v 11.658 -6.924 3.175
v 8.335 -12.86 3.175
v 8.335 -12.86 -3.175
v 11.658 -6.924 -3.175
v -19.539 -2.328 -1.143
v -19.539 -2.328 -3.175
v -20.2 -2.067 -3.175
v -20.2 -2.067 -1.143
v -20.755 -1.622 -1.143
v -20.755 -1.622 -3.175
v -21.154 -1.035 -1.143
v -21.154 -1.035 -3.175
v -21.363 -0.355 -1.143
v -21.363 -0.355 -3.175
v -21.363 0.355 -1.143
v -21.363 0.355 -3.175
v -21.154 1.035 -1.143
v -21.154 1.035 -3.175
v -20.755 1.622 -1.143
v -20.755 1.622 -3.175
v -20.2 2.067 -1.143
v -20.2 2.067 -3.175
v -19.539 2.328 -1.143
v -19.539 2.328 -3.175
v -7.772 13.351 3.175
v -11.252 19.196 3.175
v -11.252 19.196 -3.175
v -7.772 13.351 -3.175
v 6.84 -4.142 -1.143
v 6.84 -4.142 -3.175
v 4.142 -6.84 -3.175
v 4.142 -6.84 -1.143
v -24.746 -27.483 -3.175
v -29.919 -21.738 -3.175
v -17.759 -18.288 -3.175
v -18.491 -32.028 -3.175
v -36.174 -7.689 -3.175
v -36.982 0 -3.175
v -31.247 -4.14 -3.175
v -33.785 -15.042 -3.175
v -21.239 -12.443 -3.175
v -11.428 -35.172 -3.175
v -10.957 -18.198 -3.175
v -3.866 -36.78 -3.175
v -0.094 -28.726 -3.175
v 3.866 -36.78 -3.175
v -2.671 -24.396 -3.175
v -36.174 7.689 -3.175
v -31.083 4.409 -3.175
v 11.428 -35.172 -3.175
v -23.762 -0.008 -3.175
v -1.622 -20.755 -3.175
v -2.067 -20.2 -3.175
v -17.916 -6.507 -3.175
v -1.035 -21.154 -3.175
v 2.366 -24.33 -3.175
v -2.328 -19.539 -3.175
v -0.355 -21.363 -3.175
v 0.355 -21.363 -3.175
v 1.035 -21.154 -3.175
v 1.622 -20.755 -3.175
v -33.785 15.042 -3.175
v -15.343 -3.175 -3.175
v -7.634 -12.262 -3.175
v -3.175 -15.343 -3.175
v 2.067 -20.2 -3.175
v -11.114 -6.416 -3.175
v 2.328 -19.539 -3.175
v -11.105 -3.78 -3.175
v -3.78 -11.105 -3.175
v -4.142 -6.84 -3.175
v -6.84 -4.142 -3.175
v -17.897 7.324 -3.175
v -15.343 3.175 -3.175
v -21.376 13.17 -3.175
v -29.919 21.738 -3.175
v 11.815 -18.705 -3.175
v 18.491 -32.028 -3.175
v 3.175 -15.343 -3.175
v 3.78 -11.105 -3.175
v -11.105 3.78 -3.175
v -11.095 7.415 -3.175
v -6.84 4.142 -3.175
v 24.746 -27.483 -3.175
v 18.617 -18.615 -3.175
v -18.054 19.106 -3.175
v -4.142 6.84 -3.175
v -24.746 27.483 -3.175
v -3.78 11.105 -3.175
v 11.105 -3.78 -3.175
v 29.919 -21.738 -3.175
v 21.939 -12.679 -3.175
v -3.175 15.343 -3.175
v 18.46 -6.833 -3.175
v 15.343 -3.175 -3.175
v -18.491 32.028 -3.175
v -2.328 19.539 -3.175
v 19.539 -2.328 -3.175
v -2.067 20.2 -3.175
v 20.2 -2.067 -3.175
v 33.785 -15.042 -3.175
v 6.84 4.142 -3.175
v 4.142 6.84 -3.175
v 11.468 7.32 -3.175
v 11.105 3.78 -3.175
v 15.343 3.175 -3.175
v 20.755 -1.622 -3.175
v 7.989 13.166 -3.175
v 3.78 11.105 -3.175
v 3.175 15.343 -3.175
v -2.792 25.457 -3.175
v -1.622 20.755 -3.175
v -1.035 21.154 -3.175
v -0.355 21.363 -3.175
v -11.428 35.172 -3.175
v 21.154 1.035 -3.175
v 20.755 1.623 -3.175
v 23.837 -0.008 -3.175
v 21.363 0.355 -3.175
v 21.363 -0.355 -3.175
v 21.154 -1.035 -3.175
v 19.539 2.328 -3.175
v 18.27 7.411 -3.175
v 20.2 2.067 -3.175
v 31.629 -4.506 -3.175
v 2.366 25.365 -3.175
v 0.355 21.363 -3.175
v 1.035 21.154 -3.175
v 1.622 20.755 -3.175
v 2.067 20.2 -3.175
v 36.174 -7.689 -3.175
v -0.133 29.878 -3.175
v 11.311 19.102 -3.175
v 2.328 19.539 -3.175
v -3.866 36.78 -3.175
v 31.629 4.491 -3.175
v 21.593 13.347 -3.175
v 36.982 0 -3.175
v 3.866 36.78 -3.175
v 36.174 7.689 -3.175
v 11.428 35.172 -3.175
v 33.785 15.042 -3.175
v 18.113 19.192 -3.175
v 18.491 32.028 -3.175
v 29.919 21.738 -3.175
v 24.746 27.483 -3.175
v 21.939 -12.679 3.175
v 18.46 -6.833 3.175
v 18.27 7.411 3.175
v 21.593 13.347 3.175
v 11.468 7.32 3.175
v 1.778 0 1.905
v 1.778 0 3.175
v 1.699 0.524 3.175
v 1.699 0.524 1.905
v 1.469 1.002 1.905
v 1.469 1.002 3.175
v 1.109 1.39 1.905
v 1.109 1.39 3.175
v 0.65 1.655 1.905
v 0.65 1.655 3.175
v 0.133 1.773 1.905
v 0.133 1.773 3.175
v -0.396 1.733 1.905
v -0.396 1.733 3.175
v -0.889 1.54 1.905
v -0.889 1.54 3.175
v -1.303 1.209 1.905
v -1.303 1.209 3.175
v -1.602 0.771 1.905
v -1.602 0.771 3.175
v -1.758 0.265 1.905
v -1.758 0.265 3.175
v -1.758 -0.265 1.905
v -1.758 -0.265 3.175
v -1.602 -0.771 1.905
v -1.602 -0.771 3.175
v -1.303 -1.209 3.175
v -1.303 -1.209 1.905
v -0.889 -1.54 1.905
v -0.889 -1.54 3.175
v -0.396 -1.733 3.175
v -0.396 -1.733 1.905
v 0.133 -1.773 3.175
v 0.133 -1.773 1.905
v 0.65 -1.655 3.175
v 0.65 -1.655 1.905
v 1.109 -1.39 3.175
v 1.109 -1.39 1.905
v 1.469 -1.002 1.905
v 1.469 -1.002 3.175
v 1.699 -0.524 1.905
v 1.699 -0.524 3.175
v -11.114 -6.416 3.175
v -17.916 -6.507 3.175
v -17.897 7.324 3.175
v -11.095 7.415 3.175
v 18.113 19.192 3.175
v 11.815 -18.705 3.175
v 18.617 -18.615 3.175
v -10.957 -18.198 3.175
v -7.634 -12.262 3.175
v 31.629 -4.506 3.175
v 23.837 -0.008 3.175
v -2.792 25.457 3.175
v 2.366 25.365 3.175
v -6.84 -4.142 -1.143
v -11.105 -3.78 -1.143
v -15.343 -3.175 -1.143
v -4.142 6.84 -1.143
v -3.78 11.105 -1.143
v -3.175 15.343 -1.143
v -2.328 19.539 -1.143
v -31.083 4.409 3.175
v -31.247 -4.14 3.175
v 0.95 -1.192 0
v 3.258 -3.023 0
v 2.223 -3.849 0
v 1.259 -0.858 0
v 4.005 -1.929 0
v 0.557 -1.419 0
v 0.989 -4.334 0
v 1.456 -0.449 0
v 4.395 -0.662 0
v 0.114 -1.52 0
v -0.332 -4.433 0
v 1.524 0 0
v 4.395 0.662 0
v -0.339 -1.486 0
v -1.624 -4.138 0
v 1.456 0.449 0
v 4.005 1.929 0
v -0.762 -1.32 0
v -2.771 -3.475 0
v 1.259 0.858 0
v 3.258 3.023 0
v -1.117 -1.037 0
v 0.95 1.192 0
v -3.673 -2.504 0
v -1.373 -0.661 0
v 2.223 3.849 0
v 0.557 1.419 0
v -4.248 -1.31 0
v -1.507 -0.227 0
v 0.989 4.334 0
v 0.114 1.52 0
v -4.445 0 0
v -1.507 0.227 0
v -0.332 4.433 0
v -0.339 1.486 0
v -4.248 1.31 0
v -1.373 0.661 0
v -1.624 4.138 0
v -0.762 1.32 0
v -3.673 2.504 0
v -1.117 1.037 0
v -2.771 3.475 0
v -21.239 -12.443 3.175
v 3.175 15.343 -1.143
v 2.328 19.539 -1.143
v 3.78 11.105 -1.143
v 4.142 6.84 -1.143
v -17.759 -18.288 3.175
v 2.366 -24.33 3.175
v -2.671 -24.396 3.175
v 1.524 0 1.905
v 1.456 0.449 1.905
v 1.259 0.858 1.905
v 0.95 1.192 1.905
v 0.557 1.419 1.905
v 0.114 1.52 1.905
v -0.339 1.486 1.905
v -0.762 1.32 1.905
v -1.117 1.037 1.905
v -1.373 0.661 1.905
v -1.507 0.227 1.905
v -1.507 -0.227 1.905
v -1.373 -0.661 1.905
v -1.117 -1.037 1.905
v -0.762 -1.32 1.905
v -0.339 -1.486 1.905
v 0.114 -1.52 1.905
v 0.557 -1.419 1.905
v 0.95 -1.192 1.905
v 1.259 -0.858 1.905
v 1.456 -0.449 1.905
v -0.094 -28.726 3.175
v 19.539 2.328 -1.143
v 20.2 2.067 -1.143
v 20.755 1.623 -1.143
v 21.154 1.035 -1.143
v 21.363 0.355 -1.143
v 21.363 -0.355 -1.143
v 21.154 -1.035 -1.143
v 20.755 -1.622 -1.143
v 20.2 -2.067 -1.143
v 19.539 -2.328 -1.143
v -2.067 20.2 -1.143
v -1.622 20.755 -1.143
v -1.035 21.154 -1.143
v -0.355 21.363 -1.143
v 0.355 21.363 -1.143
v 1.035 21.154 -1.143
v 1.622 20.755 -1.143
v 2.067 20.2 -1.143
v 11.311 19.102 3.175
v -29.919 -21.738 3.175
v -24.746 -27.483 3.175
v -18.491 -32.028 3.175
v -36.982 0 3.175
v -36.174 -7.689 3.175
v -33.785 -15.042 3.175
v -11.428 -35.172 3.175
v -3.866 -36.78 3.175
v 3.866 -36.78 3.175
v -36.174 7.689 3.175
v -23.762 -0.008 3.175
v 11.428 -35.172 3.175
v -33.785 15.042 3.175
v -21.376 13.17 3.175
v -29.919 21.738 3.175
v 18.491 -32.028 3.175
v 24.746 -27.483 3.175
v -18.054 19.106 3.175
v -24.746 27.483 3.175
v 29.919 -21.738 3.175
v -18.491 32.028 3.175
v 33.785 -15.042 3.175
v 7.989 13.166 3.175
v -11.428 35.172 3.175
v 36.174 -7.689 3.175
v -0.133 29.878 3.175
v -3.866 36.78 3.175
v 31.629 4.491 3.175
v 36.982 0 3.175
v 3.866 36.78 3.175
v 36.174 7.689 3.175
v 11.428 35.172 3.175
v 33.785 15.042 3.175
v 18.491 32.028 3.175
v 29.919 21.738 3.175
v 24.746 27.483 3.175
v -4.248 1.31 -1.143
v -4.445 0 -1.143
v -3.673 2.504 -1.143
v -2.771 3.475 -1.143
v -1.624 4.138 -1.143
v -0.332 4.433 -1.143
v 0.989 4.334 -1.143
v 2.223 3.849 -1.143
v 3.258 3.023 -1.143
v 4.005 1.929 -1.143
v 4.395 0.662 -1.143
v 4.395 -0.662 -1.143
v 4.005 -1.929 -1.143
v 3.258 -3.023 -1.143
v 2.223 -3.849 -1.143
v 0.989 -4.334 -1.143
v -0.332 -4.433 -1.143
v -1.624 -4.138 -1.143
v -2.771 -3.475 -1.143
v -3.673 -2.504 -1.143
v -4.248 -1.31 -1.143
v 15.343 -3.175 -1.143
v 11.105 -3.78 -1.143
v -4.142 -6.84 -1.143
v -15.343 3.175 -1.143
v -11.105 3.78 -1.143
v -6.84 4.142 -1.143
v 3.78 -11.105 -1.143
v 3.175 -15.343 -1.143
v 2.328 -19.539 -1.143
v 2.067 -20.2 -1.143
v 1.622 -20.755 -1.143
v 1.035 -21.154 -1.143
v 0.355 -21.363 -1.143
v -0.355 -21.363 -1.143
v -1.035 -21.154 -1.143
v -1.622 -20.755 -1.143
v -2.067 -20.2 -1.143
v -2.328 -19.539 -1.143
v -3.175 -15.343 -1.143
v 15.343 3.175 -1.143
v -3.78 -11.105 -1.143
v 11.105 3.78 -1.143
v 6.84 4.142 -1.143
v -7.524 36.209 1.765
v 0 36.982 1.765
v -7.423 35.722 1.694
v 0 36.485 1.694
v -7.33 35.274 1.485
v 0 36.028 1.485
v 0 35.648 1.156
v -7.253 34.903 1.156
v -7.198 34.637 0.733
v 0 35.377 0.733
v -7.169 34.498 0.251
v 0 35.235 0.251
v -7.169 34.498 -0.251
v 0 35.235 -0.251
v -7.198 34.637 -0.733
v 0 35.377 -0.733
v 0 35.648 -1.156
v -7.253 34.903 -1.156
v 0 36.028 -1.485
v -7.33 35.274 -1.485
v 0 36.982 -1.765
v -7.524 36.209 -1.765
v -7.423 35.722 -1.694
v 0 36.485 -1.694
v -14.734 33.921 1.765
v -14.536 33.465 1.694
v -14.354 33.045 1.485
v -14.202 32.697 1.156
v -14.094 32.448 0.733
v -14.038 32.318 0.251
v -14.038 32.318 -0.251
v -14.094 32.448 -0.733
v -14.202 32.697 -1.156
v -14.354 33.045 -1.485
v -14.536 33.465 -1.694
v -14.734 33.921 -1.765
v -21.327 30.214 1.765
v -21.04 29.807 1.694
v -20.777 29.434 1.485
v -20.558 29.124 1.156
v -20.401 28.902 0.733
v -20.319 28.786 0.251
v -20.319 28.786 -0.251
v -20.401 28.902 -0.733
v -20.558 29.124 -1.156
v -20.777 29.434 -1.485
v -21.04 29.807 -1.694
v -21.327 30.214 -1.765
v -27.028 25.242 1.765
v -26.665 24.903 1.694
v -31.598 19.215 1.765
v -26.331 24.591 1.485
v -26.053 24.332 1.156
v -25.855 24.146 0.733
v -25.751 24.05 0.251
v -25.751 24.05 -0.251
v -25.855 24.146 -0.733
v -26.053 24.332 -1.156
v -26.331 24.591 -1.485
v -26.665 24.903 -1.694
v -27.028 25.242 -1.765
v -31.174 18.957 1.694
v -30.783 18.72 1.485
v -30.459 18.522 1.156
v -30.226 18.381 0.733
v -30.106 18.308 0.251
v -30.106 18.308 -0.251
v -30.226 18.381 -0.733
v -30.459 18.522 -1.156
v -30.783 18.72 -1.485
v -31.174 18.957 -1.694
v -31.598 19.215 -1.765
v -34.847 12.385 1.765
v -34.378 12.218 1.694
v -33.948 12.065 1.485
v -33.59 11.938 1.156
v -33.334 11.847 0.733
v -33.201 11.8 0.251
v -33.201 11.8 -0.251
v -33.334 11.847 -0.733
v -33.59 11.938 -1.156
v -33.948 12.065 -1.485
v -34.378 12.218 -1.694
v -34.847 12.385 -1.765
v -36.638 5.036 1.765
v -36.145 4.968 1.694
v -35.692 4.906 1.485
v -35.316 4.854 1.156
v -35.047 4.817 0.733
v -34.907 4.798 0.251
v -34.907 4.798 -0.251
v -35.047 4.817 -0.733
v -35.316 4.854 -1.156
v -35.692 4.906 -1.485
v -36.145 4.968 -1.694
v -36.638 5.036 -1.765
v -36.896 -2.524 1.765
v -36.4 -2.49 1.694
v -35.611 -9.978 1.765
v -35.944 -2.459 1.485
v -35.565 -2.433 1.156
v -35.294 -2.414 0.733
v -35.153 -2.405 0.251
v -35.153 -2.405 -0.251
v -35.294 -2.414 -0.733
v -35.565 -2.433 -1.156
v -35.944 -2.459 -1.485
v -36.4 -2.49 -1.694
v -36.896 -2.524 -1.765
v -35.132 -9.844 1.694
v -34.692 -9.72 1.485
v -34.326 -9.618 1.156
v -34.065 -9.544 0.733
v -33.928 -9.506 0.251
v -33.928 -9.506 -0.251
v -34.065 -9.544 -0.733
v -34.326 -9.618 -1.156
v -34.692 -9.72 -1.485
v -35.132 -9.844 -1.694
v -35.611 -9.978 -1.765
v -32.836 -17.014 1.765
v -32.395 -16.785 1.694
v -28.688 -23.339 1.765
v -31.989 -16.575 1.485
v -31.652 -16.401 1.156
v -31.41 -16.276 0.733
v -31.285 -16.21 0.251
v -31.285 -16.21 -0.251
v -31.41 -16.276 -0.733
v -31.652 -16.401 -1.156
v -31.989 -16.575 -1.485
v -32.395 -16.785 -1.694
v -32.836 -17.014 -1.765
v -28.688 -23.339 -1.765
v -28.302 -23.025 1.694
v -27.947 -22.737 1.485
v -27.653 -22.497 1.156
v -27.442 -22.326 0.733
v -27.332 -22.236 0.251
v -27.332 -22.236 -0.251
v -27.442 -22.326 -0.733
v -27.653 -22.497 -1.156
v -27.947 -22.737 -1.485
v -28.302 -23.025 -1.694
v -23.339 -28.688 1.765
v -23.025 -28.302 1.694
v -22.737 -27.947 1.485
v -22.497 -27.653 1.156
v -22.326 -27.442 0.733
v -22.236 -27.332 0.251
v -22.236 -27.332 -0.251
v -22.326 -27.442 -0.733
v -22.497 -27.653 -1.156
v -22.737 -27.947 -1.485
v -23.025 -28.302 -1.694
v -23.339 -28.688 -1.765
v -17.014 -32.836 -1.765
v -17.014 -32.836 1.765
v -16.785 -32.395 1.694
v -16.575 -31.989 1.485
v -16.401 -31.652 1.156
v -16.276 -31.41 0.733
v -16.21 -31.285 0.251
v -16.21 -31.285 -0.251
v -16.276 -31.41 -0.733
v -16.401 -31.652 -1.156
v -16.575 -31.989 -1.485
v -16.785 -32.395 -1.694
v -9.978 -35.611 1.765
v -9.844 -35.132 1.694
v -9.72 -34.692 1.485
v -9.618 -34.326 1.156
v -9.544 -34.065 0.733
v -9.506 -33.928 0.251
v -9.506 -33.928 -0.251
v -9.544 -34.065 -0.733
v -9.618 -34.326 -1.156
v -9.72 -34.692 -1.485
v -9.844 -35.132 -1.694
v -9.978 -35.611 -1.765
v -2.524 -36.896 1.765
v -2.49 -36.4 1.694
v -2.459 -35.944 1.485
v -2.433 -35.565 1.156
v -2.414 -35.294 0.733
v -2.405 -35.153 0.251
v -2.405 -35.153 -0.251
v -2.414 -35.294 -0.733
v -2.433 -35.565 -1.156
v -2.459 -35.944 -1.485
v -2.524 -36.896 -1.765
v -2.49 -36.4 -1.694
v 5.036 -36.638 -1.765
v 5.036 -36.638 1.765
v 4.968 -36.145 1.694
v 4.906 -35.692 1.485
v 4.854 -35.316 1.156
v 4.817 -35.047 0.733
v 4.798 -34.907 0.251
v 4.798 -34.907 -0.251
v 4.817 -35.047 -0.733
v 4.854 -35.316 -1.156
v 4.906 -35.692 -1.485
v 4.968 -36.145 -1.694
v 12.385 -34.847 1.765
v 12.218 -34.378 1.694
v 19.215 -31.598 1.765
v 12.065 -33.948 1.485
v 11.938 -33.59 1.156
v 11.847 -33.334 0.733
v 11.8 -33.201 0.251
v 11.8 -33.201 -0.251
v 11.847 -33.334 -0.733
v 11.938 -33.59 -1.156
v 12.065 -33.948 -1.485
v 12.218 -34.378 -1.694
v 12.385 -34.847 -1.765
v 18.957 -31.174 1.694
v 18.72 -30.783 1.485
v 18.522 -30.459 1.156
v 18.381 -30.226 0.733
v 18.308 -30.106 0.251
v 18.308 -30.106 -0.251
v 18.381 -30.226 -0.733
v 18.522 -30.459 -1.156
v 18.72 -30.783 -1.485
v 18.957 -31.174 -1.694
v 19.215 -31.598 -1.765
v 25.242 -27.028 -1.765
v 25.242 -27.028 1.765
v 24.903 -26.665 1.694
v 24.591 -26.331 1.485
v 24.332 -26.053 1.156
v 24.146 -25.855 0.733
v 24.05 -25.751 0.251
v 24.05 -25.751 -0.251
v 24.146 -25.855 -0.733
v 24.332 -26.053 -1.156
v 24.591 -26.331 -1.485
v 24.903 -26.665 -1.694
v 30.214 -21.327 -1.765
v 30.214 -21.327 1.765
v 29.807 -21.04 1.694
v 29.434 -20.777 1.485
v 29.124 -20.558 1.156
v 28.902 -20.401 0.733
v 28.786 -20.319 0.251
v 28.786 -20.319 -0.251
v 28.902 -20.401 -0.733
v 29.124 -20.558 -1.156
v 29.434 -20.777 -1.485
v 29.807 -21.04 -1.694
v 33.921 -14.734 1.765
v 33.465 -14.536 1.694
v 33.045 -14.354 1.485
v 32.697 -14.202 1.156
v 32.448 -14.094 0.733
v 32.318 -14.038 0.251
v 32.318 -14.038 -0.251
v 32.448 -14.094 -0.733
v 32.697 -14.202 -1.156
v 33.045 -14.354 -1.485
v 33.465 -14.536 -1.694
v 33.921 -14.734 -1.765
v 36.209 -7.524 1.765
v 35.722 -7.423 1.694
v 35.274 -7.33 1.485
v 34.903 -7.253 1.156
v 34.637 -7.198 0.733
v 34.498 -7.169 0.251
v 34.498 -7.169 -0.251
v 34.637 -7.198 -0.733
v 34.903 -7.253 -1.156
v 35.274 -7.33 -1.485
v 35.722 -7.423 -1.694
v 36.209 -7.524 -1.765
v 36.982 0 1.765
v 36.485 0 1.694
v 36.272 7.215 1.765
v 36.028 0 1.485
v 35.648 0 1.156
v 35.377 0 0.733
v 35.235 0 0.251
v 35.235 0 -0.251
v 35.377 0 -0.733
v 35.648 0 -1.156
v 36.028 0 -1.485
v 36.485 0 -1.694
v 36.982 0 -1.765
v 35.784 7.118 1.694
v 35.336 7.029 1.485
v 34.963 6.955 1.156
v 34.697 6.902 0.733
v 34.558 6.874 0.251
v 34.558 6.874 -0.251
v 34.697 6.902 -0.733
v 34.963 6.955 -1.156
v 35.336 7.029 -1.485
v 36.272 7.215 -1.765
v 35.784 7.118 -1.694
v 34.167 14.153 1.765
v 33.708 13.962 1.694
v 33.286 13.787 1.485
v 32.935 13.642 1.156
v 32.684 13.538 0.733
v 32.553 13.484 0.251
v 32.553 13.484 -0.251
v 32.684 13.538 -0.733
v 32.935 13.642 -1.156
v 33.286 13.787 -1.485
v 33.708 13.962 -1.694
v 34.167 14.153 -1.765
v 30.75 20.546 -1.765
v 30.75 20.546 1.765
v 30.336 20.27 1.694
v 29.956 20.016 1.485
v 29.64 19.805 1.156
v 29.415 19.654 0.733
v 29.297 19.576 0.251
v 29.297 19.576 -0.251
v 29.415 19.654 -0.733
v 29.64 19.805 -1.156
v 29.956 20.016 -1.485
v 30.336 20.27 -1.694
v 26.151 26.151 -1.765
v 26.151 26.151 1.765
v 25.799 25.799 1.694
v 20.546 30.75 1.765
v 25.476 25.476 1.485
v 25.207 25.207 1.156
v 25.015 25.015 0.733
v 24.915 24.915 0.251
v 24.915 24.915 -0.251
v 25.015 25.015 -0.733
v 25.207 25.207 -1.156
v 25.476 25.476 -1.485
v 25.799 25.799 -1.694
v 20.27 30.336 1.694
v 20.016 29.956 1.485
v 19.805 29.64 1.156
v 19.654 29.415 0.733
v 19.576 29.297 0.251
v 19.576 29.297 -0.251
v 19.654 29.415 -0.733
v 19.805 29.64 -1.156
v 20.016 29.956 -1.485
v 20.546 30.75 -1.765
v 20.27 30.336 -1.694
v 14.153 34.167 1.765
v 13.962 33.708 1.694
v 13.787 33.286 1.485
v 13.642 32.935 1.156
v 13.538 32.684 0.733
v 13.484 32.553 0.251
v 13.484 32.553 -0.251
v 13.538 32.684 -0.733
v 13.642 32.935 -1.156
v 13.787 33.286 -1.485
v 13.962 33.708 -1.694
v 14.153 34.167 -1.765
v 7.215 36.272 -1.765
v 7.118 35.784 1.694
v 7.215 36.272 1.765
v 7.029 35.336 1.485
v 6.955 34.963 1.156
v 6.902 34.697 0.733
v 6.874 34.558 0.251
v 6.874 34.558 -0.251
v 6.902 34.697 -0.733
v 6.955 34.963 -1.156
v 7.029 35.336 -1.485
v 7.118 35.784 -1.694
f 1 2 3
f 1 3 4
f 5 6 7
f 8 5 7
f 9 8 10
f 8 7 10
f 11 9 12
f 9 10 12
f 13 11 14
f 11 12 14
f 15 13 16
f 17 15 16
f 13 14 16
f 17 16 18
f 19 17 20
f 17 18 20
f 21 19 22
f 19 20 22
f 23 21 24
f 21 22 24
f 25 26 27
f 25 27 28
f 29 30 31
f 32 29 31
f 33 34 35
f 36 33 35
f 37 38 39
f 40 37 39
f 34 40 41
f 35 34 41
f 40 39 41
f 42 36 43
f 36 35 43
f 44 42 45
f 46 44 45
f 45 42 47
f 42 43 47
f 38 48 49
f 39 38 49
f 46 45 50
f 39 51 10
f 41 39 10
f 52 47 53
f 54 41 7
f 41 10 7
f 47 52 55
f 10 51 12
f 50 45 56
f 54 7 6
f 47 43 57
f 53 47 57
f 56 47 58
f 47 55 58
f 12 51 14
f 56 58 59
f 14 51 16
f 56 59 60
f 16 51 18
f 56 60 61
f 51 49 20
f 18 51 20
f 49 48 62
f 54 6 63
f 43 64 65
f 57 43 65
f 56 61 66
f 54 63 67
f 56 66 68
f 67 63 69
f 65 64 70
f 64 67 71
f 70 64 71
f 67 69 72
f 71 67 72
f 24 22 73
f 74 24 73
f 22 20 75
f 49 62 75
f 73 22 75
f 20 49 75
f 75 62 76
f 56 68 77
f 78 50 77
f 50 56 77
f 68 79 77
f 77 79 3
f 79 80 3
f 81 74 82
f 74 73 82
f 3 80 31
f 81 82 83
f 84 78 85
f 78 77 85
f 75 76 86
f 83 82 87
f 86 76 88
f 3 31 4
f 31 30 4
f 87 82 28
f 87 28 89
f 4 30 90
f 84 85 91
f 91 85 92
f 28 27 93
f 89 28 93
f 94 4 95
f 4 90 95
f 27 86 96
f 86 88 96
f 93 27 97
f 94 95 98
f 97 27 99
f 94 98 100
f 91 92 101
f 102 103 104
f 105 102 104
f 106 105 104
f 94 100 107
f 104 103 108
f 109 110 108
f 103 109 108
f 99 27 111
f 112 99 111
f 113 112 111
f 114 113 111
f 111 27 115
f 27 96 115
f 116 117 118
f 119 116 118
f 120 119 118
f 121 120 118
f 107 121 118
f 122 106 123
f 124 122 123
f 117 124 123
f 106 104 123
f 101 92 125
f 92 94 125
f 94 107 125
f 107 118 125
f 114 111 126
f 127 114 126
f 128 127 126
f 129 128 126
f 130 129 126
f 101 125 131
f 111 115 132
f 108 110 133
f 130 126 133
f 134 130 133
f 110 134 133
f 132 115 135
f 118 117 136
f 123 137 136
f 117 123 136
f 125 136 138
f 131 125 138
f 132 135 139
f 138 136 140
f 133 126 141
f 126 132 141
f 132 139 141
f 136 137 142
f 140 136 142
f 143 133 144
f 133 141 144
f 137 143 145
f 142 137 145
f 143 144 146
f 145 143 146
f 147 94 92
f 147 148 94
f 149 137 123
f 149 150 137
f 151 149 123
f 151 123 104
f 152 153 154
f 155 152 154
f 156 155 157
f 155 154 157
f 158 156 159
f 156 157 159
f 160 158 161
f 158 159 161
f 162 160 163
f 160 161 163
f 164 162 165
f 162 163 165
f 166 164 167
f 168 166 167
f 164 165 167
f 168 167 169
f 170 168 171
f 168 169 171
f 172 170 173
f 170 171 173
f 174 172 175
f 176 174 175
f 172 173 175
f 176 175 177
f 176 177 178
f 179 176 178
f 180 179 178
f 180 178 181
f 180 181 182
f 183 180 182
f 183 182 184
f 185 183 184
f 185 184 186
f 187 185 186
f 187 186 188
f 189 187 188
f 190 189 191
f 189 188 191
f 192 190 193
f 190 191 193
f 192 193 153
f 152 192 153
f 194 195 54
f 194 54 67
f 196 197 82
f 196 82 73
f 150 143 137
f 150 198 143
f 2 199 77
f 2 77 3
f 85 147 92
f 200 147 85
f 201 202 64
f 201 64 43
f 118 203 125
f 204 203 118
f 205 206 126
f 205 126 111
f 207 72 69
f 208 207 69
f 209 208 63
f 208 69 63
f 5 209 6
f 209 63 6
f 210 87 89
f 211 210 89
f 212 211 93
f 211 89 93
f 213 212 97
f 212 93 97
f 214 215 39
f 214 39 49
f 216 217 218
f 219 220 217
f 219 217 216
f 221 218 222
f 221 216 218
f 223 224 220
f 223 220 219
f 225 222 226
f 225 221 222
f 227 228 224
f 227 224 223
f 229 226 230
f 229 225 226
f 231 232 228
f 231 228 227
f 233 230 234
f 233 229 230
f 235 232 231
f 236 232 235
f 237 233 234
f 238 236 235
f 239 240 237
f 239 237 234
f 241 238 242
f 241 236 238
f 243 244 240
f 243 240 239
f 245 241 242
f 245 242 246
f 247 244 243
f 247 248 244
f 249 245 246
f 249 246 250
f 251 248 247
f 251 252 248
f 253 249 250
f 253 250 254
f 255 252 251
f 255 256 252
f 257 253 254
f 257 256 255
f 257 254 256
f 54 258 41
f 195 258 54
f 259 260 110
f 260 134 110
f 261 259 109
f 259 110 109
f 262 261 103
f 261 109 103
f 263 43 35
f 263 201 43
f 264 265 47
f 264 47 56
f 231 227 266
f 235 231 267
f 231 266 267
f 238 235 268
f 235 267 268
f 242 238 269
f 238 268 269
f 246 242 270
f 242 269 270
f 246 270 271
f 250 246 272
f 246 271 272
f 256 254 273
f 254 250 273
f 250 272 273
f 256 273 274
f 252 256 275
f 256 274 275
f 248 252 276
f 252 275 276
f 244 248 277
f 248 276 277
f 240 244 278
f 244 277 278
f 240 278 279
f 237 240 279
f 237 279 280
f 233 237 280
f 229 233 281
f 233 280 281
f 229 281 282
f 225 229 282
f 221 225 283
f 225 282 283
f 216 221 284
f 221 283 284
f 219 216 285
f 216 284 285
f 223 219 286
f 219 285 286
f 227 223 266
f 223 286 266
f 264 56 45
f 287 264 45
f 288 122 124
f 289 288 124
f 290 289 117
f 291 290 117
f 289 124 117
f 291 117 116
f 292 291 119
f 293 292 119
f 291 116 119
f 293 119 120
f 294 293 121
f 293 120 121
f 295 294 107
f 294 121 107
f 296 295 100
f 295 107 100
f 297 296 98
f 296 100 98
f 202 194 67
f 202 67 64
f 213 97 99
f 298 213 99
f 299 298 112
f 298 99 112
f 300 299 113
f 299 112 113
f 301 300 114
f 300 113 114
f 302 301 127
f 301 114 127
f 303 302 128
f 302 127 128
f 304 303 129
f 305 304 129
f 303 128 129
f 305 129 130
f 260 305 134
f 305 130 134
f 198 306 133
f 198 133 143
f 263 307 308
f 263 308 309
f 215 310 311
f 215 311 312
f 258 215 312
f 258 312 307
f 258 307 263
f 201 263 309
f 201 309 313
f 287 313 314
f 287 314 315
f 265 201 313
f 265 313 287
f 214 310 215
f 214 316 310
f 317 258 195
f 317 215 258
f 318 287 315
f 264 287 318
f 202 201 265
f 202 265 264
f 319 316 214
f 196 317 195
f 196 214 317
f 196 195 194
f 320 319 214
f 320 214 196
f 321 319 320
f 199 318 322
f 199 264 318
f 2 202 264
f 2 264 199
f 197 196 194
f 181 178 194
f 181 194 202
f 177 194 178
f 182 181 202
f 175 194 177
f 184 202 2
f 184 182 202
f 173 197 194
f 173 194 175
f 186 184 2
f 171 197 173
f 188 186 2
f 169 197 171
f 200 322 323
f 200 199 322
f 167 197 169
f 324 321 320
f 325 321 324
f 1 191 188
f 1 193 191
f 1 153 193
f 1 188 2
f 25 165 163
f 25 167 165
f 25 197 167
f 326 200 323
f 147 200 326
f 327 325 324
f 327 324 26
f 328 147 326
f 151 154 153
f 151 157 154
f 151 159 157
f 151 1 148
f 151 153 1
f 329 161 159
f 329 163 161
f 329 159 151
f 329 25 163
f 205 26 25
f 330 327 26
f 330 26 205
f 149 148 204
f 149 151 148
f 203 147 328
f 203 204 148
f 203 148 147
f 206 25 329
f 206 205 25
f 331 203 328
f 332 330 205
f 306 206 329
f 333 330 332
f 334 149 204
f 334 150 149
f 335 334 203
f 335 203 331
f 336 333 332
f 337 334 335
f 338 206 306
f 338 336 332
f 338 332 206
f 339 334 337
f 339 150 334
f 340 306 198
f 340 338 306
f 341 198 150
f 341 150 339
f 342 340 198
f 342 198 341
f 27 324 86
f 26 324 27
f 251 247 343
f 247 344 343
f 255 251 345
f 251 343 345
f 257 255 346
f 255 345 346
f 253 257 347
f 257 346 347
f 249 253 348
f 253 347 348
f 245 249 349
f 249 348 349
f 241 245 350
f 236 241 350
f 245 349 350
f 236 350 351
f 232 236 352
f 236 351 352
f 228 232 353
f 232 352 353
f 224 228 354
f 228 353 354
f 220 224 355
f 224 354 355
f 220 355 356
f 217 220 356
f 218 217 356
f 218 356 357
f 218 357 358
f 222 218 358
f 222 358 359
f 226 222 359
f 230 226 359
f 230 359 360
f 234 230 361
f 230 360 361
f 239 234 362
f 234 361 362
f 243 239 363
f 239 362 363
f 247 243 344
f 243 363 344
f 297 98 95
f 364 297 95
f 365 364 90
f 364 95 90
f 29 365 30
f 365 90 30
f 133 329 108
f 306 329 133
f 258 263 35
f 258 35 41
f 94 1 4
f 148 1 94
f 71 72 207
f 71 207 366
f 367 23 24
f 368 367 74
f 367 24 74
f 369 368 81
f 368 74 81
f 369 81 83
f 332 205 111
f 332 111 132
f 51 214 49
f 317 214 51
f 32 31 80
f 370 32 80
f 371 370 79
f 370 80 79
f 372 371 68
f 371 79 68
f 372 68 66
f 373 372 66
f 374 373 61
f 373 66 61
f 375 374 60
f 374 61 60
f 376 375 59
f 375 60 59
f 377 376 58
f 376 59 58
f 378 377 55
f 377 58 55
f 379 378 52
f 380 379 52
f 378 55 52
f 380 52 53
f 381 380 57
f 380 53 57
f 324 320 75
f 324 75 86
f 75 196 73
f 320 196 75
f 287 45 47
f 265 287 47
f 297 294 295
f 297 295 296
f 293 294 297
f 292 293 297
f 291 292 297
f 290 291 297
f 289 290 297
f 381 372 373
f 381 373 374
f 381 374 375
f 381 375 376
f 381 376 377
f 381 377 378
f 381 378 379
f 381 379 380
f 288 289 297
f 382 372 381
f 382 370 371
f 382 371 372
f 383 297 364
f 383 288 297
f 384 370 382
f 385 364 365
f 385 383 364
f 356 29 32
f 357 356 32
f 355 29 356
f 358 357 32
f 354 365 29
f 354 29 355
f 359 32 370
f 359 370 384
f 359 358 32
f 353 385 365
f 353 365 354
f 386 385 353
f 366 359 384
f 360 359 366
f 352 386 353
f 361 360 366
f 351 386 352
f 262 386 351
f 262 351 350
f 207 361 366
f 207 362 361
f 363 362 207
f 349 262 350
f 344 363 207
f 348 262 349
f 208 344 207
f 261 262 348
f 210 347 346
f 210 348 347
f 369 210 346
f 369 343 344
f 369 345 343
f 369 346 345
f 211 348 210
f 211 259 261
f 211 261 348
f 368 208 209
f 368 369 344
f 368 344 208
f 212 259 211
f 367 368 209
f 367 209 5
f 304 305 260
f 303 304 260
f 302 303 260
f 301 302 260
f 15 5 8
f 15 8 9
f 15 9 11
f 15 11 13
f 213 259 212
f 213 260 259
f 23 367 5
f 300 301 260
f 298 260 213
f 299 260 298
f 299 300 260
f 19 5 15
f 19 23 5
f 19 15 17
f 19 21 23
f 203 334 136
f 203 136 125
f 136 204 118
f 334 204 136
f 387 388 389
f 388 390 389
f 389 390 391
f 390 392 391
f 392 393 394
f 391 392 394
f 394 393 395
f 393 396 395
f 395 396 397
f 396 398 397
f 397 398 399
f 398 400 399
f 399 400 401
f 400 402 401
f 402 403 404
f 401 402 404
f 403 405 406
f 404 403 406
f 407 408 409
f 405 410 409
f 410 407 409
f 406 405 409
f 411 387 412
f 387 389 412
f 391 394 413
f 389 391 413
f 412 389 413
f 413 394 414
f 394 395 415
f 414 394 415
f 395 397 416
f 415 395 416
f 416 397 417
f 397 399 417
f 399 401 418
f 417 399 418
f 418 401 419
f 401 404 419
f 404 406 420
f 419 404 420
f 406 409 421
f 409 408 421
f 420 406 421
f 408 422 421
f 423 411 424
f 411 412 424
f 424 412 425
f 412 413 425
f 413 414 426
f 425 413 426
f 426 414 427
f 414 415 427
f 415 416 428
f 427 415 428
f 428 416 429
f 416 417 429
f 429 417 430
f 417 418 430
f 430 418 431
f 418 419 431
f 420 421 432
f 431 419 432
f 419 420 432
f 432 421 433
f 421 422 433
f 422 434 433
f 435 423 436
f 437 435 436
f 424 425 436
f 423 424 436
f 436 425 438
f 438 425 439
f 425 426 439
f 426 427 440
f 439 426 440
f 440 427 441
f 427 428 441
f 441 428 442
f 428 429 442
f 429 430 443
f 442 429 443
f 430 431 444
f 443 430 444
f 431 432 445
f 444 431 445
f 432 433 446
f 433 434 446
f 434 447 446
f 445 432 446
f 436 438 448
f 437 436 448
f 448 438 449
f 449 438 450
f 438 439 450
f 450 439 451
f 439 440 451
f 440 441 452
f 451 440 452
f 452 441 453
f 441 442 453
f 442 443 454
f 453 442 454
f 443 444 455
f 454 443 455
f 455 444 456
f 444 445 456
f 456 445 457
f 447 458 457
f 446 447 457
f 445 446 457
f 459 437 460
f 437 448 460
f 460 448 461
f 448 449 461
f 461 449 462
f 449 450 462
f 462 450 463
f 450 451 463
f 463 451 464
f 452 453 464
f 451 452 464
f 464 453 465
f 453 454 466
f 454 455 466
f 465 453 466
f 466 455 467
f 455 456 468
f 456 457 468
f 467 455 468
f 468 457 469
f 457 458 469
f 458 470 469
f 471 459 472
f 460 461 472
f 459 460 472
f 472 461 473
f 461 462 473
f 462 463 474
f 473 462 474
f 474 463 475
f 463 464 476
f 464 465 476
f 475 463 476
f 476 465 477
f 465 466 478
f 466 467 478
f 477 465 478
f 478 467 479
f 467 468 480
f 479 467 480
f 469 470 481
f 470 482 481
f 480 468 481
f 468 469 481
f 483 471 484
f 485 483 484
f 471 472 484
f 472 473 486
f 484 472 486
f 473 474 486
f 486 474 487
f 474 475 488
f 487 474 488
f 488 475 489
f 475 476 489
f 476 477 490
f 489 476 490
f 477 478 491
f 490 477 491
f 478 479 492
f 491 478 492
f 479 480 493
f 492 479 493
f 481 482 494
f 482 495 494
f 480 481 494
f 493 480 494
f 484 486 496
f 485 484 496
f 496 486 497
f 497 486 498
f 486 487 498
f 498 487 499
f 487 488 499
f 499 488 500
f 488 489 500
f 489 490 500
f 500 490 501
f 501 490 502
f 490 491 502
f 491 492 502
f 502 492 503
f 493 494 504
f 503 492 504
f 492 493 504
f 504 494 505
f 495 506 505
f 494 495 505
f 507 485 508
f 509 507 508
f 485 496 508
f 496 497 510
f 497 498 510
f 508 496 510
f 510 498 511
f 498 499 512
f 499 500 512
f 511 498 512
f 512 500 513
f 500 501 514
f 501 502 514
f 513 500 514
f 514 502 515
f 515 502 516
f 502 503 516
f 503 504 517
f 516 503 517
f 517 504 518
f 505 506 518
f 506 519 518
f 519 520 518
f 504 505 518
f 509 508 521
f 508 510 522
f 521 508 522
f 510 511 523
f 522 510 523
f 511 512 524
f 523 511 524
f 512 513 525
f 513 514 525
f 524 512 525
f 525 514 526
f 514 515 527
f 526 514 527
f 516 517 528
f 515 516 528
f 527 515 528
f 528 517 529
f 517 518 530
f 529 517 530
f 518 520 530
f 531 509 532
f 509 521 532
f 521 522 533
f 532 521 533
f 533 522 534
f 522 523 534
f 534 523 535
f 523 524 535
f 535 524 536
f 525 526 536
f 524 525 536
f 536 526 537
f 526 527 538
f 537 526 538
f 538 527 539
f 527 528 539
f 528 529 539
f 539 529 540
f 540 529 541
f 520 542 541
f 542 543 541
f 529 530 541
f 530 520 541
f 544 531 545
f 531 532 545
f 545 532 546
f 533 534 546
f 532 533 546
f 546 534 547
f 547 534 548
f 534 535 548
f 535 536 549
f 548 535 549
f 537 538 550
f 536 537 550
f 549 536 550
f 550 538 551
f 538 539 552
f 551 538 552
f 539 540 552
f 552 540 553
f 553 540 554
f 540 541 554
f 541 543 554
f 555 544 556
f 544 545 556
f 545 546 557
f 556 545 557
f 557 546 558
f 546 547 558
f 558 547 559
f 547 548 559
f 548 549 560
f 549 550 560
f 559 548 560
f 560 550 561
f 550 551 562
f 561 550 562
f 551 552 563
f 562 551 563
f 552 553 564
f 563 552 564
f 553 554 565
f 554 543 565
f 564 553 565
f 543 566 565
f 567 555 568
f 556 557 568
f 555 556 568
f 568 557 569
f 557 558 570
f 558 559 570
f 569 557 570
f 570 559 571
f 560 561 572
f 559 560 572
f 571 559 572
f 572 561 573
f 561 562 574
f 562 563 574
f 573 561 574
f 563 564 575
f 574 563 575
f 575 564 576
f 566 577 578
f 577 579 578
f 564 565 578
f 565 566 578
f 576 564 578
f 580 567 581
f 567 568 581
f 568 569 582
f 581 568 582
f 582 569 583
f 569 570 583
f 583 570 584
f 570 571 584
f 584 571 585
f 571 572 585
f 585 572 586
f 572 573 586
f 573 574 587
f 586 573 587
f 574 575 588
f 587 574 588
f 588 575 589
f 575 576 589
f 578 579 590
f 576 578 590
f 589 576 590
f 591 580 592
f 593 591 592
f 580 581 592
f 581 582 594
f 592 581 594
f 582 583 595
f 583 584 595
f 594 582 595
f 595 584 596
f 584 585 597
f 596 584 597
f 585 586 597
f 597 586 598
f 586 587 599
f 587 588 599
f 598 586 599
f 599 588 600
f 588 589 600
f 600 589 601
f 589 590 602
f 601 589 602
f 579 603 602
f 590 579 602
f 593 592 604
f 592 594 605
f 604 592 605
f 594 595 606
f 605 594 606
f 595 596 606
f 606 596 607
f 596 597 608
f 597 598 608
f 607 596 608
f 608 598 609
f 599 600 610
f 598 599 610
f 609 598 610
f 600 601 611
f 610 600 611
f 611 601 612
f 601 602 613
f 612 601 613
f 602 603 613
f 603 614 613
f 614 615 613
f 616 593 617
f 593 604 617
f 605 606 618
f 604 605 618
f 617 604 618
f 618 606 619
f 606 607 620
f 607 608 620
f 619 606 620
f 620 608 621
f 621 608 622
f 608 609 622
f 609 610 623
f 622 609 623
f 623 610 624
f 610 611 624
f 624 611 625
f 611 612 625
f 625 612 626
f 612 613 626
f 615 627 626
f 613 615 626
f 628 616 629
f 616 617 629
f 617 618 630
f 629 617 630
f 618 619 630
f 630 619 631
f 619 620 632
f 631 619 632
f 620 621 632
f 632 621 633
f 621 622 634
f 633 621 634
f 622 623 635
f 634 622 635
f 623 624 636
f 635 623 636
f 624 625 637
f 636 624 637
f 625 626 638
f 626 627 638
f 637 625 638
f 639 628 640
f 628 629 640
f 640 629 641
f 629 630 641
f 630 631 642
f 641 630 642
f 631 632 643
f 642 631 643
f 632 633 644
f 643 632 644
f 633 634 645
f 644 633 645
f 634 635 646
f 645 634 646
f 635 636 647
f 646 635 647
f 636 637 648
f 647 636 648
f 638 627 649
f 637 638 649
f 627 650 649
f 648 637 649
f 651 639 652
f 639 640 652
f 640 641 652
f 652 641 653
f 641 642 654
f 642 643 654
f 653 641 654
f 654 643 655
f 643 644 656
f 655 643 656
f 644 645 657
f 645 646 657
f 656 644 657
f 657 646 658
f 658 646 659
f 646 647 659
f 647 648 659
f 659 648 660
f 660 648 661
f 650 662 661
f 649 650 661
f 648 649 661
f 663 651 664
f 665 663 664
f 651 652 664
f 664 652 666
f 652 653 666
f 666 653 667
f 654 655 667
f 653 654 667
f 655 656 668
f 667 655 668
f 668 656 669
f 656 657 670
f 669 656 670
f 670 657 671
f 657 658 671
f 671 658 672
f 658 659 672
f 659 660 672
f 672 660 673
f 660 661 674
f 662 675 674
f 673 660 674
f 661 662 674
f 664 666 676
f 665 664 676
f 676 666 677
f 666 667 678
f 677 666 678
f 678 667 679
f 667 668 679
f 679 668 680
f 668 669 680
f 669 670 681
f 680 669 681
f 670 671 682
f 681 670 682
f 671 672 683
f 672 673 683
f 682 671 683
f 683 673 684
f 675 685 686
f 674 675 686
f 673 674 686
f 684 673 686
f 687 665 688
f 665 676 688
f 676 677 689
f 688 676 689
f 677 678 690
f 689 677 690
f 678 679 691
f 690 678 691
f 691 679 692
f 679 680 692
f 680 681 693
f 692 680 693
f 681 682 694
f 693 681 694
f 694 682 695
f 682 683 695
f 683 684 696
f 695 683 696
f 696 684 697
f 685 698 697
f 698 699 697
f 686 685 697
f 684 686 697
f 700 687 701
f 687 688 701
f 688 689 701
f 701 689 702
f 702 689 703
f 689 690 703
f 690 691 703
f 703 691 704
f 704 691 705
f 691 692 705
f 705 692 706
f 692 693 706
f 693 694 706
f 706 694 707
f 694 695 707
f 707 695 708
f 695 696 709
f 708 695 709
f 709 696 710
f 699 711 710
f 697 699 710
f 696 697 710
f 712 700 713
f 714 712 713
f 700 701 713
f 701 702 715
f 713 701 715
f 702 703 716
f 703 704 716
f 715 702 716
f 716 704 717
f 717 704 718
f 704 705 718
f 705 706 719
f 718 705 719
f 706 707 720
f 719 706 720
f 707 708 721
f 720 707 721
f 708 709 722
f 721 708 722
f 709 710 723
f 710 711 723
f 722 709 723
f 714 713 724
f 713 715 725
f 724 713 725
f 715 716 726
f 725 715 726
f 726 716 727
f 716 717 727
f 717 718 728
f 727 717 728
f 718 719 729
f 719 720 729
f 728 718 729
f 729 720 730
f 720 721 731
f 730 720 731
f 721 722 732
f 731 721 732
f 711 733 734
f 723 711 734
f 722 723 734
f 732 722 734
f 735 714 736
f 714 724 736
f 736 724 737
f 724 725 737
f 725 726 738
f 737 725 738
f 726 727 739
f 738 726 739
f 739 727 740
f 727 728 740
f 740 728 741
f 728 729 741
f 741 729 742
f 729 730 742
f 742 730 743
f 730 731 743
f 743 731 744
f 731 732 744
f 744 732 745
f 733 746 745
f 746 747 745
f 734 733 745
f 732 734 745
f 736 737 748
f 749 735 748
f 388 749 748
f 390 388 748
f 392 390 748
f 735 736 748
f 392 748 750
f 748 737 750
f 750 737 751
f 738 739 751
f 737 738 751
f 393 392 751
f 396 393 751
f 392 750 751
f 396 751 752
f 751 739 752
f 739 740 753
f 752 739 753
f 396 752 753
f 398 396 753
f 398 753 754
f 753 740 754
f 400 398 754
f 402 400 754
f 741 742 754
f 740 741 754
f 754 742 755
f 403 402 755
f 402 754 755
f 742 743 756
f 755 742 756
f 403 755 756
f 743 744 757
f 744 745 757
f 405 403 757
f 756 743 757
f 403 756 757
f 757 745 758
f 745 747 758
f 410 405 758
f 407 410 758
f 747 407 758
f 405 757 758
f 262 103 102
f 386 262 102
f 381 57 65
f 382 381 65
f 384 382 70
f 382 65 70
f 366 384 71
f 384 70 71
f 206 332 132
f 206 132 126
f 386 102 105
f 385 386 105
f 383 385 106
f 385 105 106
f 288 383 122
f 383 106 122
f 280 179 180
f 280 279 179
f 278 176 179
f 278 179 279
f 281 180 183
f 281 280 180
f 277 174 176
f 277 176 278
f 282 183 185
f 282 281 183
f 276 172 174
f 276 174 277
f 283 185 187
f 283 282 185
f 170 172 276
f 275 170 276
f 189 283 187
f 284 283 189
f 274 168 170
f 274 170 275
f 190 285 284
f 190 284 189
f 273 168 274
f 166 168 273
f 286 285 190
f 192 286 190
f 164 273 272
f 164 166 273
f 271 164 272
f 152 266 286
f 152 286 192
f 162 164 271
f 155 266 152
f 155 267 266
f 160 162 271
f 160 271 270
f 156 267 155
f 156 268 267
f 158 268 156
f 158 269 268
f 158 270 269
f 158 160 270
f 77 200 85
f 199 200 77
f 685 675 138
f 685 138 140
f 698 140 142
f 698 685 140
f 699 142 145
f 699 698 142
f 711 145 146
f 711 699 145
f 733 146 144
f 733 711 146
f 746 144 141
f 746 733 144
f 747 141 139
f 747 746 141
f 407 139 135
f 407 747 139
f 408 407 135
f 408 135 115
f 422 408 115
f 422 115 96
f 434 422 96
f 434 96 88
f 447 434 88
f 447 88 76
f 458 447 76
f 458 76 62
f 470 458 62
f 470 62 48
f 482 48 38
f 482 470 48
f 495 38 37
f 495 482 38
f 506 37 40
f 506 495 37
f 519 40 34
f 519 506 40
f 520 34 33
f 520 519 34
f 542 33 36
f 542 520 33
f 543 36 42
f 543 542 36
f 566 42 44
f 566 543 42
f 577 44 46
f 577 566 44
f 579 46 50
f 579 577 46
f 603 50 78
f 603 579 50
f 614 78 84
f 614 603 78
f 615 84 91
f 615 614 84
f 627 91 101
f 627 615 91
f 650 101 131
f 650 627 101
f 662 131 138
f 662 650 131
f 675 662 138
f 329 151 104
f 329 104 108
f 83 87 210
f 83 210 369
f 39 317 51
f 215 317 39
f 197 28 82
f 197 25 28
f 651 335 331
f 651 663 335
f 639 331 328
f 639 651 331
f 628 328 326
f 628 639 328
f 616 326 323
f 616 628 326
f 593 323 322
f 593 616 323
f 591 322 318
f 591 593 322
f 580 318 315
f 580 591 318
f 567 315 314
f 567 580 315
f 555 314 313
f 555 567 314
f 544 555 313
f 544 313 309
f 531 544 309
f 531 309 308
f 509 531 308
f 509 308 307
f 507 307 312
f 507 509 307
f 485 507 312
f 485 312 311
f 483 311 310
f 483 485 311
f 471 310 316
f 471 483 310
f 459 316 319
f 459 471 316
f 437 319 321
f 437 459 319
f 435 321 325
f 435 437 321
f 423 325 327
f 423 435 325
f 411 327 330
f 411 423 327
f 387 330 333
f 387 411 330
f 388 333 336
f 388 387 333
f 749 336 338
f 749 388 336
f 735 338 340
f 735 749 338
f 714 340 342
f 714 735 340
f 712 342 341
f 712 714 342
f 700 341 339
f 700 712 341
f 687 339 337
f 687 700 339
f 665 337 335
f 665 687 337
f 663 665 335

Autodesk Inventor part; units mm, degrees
ref_plane "YZ Plane" through (0, 0, 0) normal (1, 0, 0) x (0, 1, 0)
ref_plane "XZ Plane" through (0, 0, 0) normal (0, 1, 0) x (-1, 0, 0)
ref_plane "XY Plane" through (0, 0, 0) normal (0, 0, 1) x (1, 0, 0)
sketch "Sketch1" plane through (0, 0, 0) normal (0, 0, 1) x (1, 0, 0)
  circle A0 centre (0, 0) radius 36.9824
  dimension "d17" = 73.9648
extrude "Extrusion1" add sketch "Sketch1" along normal mid plane 6.35
sketch "Sketch4" plane through (0, 0, 0) normal (1, 0, 0) x (0, 1, 0)
  circle A0 centre (36.9824, 0) radius 1.7653
  line L0 (36.9824, -3.175) -> (36.9824, 3.175) construction
  line L1 (36.9824, -3.175) -> (36.9824, 3.175)
  line L2 (36.9824, -3.175) -> (36.9824, 3.175) projected
  line L3 (0, -6.8515) -> (0, 6.9022)
  point P0 (0, 0)
  dimension "d5" = 3.5306
revolve "Revolution1" cut sketch "Sketch4" angle 360 about axis through (0, 0, -6.8515) along (0, 0, 1)
sketch "Sketch5" plane through (0, -10.4797, 3.175) normal (0, 0, 1) x (1, 0, 0)
  line L0 (11.3113, 29.5816) -> (18.1134, 29.6722)
  line L1 (18.1134, 29.6722) -> (21.5928, 23.8267)
  line L2 (21.5928, 23.8267) -> (18.2702, 17.8907)
  line L3 (18.2702, 17.8907) -> (11.4682, 17.8001)
  line L4 (11.4682, 17.8001) -> (7.9887, 23.6456)
  line L5 (7.9887, 23.6456) -> (11.3113, 29.5816)
  line L6 (-18.0537, 29.5853) -> (-11.2517, 29.6759)
  line L7 (-11.2517, 29.6759) -> (-7.7722, 23.8304)
  line L8 (-7.7722, 23.8304) -> (-11.0948, 17.8944)
  line L9 (-11.0948, 17.8944) -> (-17.8969, 17.8038)
  line L10 (-17.8969, 17.8038) -> (-21.3763, 23.6493)
  line L11 (-21.3763, 23.6493) -> (-18.0537, 29.5853)
  line L12 (-17.916, 3.9729) -> (-11.114, 4.0635)
  line L13 (-11.114, 4.0635) -> (-7.6345, -1.782)
  line L14 (-7.6345, -1.782) -> (-10.9571, -7.718)
  line L15 (-10.9571, -7.718) -> (-17.7592, -7.8086)
  line L16 (-17.7592, -7.8086) -> (-21.2386, -1.9631)
  line L17 (-21.2386, -1.9631) -> (-17.916, 3.9729)
  line L18 (11.6578, 3.5557) -> (18.4598, 3.6463)
  line L19 (18.4598, 3.6463) -> (21.9393, -2.1992)
  line L20 (21.9393, -2.1992) -> (18.6167, -8.1352)
  line L21 (18.6167, -8.1352) -> (11.8146, -8.2257)
  line L22 (11.8146, -8.2257) -> (8.3352, -2.3803)
  line L23 (8.3352, -2.3803) -> (11.6578, 3.5557)
  line L24 (-23.7615, 10.4722) -> (-31.2466, 6.34)
  line L25 (-31.2466, 6.34) -> (-31.0827, 14.8884)
  line L26 (-31.0827, 14.8884) -> (-23.7615, 10.4722)
  line L27 (23.8373, 10.4722) -> (31.6292, 14.9709)
  line L28 (31.6292, 14.9709) -> (31.6292, 5.9736)
  line L29 (31.6292, 5.9736) -> (23.8373, 10.4722)
  line L30 (2.3663, 35.8446) -> (-2.7917, 35.9364)
  line L31 (-2.7917, 35.9364) -> (-0.1332, 40.3574)
  line L32 (-0.1332, 40.3574) -> (2.3663, 35.8446)
  line L33 (2.3663, -13.8498) -> (-0.0945, -18.246)
  line L34 (-0.0945, -18.246) -> (-2.6714, -13.9168)
  line L35 (-2.6714, -13.9168) -> (2.3663, -13.8498)
  point P0 (0, 10.4797)
  point P1 (14.7908, 23.7362)
  point P2 (-14.5743, 23.7399)
  point P3 (-14.4366, -1.8725)
  point P4 (15.1372, -2.2897)
  point P5 (-28.6969, 10.5669)
  point P6 (29.0319, 10.4722)
  point P7 (-0.1862, 37.3795)
  point P8 (-0.1332, -15.3375)
extrude "Extrusion3" cut sketch "Sketch5" against normal through all
sketch "Sketch6" plane through (0, -10.4797, 3.175) normal (0, 0, 1) x (1, 0, 0)
  circle A0 centre (0, 10.4797) radius 1.524
  circle A1 centre (0, 10.4797) radius 36.9824 projected
  dimension "d9" = 3.048
extrude "Extrusion4" cut sketch "Sketch6" against normal through all contours A0
sketch "Sketch9" plane through (0, 0, -3.175) normal (0, 0, -1) x (-1, 0, 0)
  circle A0 centre (0, 0) radius 4.445
  circle A1 centre (0, 0) radius 1.524 projected
  dimension "d14" = 8.89
extrude "Extrusion5" cut sketch "Sketch9" against normal blind 3.175
sketch "Sketch11" plane through (0, -10.4797, -3.175) normal (0, 0, -1) x (-1, 0, 0)
  arc A0 (6.84, 6.338) -> (19.5394, 8.1514) centre (2.6508, 81.0506) ccw
  arc A1 (19.5394, 8.1514) -> (19.5394, 12.8081) centre (19, 10.4797) ccw
  arc A2 (19.5394, 12.8081) -> (6.84, 14.6214) centre (2.6508, -60.0911) ccw
  arc A3 (4.1417, 17.3197) -> (2.3283, 30.0191) centre (-70.5709, 13.1305) ccw
  arc A4 (2.3283, 30.0191) -> (-2.3283, 30.0191) centre (0, 29.4797) ccw
  arc A5 (-2.3283, 30.0191) -> (-4.1417, 17.3197) centre (70.5709, 13.1305) ccw
  arc A6 (-6.84, 14.6214) -> (-19.5394, 12.8081) centre (-2.6508, -60.0911) ccw
  arc A7 (-19.5394, 12.8081) -> (-19.5394, 8.1514) centre (-19, 10.4797) ccw
  arc A8 (-19.5394, 8.1514) -> (-6.84, 6.338) centre (-2.6508, 81.0506) ccw
  arc A9 (-4.1417, 3.6397) -> (-2.3283, -9.0597) centre (70.5709, 7.8289) ccw
  arc A10 (-2.3283, -9.0597) -> (2.3283, -9.0597) centre (0, -8.5203) ccw
  arc A11 (2.3283, -9.0597) -> (4.1417, 3.6397) centre (-70.5709, 7.8289) ccw
  circle A12 centre (0, 20.7297) radius 0.4953
  circle A13 centre (0, 23.7197) radius 0.4953
  circle A14 centre (0, 26.4497) radius 0.4953
  circle A15 centre (0, 17.8197) radius 0.5
  circle A16 centre (0, 10.4797) radius 2.9464
  circle A17 centre (-7.34, 10.4797) radius 0.5
  circle A18 centre (-10.25, 10.4797) radius 0.4953
  circle A19 centre (-13.24, 10.4797) radius 0.4953
  circle A20 centre (-15.97, 10.4797) radius 0.4953
  circle A21 centre (7.34, 10.4797) radius 0.5
  circle A22 centre (10.25, 10.4797) radius 0.4953
  circle A23 centre (13.24, 10.4797) radius 0.4953
  circle A24 centre (15.97, 10.4797) radius 0.4953
  circle A25 centre (0, 3.1397) radius 0.5
  circle A26 centre (0, 0.2297) radius 0.4953
  circle A27 centre (0, -2.7603) radius 0.4953
  circle A28 centre (0, -5.4903) radius 0.4953
  line L0 (-4.1417, 17.3197) -> (-6.84, 14.6214)
  line L1 (4.1417, 17.3197) -> (6.84, 14.6214)
  line L2 (6.84, 6.338) -> (4.1417, 3.6397)
  line L3 (-6.84, 6.338) -> (-4.1417, 3.6397)
extrude "Extrusion6" cut sketch "Sketch11" against normal blind 2.032 contours L2 A11 A10 A9 L3 A8 A7 A6 L0 A5 A4 A3 L1 A2 A1 A0 | A12 | A13 | A14 | A15 | A17 | A18 | A19 | A20 | A21 | A22 | A23 | A24 | A25 | A26 | A27 | A28
sketch "Sketch12" plane through (0, 0, 3.175) normal (0, 0, 1) x (1, 0, 0)
  circle A0 centre (0, 0) radius 1.778
  dimension "d20" = 3.556
extrude "Extrusion7" cut sketch "Sketch12" against normal blind 1.27
properties part number "Hew O Ring"
